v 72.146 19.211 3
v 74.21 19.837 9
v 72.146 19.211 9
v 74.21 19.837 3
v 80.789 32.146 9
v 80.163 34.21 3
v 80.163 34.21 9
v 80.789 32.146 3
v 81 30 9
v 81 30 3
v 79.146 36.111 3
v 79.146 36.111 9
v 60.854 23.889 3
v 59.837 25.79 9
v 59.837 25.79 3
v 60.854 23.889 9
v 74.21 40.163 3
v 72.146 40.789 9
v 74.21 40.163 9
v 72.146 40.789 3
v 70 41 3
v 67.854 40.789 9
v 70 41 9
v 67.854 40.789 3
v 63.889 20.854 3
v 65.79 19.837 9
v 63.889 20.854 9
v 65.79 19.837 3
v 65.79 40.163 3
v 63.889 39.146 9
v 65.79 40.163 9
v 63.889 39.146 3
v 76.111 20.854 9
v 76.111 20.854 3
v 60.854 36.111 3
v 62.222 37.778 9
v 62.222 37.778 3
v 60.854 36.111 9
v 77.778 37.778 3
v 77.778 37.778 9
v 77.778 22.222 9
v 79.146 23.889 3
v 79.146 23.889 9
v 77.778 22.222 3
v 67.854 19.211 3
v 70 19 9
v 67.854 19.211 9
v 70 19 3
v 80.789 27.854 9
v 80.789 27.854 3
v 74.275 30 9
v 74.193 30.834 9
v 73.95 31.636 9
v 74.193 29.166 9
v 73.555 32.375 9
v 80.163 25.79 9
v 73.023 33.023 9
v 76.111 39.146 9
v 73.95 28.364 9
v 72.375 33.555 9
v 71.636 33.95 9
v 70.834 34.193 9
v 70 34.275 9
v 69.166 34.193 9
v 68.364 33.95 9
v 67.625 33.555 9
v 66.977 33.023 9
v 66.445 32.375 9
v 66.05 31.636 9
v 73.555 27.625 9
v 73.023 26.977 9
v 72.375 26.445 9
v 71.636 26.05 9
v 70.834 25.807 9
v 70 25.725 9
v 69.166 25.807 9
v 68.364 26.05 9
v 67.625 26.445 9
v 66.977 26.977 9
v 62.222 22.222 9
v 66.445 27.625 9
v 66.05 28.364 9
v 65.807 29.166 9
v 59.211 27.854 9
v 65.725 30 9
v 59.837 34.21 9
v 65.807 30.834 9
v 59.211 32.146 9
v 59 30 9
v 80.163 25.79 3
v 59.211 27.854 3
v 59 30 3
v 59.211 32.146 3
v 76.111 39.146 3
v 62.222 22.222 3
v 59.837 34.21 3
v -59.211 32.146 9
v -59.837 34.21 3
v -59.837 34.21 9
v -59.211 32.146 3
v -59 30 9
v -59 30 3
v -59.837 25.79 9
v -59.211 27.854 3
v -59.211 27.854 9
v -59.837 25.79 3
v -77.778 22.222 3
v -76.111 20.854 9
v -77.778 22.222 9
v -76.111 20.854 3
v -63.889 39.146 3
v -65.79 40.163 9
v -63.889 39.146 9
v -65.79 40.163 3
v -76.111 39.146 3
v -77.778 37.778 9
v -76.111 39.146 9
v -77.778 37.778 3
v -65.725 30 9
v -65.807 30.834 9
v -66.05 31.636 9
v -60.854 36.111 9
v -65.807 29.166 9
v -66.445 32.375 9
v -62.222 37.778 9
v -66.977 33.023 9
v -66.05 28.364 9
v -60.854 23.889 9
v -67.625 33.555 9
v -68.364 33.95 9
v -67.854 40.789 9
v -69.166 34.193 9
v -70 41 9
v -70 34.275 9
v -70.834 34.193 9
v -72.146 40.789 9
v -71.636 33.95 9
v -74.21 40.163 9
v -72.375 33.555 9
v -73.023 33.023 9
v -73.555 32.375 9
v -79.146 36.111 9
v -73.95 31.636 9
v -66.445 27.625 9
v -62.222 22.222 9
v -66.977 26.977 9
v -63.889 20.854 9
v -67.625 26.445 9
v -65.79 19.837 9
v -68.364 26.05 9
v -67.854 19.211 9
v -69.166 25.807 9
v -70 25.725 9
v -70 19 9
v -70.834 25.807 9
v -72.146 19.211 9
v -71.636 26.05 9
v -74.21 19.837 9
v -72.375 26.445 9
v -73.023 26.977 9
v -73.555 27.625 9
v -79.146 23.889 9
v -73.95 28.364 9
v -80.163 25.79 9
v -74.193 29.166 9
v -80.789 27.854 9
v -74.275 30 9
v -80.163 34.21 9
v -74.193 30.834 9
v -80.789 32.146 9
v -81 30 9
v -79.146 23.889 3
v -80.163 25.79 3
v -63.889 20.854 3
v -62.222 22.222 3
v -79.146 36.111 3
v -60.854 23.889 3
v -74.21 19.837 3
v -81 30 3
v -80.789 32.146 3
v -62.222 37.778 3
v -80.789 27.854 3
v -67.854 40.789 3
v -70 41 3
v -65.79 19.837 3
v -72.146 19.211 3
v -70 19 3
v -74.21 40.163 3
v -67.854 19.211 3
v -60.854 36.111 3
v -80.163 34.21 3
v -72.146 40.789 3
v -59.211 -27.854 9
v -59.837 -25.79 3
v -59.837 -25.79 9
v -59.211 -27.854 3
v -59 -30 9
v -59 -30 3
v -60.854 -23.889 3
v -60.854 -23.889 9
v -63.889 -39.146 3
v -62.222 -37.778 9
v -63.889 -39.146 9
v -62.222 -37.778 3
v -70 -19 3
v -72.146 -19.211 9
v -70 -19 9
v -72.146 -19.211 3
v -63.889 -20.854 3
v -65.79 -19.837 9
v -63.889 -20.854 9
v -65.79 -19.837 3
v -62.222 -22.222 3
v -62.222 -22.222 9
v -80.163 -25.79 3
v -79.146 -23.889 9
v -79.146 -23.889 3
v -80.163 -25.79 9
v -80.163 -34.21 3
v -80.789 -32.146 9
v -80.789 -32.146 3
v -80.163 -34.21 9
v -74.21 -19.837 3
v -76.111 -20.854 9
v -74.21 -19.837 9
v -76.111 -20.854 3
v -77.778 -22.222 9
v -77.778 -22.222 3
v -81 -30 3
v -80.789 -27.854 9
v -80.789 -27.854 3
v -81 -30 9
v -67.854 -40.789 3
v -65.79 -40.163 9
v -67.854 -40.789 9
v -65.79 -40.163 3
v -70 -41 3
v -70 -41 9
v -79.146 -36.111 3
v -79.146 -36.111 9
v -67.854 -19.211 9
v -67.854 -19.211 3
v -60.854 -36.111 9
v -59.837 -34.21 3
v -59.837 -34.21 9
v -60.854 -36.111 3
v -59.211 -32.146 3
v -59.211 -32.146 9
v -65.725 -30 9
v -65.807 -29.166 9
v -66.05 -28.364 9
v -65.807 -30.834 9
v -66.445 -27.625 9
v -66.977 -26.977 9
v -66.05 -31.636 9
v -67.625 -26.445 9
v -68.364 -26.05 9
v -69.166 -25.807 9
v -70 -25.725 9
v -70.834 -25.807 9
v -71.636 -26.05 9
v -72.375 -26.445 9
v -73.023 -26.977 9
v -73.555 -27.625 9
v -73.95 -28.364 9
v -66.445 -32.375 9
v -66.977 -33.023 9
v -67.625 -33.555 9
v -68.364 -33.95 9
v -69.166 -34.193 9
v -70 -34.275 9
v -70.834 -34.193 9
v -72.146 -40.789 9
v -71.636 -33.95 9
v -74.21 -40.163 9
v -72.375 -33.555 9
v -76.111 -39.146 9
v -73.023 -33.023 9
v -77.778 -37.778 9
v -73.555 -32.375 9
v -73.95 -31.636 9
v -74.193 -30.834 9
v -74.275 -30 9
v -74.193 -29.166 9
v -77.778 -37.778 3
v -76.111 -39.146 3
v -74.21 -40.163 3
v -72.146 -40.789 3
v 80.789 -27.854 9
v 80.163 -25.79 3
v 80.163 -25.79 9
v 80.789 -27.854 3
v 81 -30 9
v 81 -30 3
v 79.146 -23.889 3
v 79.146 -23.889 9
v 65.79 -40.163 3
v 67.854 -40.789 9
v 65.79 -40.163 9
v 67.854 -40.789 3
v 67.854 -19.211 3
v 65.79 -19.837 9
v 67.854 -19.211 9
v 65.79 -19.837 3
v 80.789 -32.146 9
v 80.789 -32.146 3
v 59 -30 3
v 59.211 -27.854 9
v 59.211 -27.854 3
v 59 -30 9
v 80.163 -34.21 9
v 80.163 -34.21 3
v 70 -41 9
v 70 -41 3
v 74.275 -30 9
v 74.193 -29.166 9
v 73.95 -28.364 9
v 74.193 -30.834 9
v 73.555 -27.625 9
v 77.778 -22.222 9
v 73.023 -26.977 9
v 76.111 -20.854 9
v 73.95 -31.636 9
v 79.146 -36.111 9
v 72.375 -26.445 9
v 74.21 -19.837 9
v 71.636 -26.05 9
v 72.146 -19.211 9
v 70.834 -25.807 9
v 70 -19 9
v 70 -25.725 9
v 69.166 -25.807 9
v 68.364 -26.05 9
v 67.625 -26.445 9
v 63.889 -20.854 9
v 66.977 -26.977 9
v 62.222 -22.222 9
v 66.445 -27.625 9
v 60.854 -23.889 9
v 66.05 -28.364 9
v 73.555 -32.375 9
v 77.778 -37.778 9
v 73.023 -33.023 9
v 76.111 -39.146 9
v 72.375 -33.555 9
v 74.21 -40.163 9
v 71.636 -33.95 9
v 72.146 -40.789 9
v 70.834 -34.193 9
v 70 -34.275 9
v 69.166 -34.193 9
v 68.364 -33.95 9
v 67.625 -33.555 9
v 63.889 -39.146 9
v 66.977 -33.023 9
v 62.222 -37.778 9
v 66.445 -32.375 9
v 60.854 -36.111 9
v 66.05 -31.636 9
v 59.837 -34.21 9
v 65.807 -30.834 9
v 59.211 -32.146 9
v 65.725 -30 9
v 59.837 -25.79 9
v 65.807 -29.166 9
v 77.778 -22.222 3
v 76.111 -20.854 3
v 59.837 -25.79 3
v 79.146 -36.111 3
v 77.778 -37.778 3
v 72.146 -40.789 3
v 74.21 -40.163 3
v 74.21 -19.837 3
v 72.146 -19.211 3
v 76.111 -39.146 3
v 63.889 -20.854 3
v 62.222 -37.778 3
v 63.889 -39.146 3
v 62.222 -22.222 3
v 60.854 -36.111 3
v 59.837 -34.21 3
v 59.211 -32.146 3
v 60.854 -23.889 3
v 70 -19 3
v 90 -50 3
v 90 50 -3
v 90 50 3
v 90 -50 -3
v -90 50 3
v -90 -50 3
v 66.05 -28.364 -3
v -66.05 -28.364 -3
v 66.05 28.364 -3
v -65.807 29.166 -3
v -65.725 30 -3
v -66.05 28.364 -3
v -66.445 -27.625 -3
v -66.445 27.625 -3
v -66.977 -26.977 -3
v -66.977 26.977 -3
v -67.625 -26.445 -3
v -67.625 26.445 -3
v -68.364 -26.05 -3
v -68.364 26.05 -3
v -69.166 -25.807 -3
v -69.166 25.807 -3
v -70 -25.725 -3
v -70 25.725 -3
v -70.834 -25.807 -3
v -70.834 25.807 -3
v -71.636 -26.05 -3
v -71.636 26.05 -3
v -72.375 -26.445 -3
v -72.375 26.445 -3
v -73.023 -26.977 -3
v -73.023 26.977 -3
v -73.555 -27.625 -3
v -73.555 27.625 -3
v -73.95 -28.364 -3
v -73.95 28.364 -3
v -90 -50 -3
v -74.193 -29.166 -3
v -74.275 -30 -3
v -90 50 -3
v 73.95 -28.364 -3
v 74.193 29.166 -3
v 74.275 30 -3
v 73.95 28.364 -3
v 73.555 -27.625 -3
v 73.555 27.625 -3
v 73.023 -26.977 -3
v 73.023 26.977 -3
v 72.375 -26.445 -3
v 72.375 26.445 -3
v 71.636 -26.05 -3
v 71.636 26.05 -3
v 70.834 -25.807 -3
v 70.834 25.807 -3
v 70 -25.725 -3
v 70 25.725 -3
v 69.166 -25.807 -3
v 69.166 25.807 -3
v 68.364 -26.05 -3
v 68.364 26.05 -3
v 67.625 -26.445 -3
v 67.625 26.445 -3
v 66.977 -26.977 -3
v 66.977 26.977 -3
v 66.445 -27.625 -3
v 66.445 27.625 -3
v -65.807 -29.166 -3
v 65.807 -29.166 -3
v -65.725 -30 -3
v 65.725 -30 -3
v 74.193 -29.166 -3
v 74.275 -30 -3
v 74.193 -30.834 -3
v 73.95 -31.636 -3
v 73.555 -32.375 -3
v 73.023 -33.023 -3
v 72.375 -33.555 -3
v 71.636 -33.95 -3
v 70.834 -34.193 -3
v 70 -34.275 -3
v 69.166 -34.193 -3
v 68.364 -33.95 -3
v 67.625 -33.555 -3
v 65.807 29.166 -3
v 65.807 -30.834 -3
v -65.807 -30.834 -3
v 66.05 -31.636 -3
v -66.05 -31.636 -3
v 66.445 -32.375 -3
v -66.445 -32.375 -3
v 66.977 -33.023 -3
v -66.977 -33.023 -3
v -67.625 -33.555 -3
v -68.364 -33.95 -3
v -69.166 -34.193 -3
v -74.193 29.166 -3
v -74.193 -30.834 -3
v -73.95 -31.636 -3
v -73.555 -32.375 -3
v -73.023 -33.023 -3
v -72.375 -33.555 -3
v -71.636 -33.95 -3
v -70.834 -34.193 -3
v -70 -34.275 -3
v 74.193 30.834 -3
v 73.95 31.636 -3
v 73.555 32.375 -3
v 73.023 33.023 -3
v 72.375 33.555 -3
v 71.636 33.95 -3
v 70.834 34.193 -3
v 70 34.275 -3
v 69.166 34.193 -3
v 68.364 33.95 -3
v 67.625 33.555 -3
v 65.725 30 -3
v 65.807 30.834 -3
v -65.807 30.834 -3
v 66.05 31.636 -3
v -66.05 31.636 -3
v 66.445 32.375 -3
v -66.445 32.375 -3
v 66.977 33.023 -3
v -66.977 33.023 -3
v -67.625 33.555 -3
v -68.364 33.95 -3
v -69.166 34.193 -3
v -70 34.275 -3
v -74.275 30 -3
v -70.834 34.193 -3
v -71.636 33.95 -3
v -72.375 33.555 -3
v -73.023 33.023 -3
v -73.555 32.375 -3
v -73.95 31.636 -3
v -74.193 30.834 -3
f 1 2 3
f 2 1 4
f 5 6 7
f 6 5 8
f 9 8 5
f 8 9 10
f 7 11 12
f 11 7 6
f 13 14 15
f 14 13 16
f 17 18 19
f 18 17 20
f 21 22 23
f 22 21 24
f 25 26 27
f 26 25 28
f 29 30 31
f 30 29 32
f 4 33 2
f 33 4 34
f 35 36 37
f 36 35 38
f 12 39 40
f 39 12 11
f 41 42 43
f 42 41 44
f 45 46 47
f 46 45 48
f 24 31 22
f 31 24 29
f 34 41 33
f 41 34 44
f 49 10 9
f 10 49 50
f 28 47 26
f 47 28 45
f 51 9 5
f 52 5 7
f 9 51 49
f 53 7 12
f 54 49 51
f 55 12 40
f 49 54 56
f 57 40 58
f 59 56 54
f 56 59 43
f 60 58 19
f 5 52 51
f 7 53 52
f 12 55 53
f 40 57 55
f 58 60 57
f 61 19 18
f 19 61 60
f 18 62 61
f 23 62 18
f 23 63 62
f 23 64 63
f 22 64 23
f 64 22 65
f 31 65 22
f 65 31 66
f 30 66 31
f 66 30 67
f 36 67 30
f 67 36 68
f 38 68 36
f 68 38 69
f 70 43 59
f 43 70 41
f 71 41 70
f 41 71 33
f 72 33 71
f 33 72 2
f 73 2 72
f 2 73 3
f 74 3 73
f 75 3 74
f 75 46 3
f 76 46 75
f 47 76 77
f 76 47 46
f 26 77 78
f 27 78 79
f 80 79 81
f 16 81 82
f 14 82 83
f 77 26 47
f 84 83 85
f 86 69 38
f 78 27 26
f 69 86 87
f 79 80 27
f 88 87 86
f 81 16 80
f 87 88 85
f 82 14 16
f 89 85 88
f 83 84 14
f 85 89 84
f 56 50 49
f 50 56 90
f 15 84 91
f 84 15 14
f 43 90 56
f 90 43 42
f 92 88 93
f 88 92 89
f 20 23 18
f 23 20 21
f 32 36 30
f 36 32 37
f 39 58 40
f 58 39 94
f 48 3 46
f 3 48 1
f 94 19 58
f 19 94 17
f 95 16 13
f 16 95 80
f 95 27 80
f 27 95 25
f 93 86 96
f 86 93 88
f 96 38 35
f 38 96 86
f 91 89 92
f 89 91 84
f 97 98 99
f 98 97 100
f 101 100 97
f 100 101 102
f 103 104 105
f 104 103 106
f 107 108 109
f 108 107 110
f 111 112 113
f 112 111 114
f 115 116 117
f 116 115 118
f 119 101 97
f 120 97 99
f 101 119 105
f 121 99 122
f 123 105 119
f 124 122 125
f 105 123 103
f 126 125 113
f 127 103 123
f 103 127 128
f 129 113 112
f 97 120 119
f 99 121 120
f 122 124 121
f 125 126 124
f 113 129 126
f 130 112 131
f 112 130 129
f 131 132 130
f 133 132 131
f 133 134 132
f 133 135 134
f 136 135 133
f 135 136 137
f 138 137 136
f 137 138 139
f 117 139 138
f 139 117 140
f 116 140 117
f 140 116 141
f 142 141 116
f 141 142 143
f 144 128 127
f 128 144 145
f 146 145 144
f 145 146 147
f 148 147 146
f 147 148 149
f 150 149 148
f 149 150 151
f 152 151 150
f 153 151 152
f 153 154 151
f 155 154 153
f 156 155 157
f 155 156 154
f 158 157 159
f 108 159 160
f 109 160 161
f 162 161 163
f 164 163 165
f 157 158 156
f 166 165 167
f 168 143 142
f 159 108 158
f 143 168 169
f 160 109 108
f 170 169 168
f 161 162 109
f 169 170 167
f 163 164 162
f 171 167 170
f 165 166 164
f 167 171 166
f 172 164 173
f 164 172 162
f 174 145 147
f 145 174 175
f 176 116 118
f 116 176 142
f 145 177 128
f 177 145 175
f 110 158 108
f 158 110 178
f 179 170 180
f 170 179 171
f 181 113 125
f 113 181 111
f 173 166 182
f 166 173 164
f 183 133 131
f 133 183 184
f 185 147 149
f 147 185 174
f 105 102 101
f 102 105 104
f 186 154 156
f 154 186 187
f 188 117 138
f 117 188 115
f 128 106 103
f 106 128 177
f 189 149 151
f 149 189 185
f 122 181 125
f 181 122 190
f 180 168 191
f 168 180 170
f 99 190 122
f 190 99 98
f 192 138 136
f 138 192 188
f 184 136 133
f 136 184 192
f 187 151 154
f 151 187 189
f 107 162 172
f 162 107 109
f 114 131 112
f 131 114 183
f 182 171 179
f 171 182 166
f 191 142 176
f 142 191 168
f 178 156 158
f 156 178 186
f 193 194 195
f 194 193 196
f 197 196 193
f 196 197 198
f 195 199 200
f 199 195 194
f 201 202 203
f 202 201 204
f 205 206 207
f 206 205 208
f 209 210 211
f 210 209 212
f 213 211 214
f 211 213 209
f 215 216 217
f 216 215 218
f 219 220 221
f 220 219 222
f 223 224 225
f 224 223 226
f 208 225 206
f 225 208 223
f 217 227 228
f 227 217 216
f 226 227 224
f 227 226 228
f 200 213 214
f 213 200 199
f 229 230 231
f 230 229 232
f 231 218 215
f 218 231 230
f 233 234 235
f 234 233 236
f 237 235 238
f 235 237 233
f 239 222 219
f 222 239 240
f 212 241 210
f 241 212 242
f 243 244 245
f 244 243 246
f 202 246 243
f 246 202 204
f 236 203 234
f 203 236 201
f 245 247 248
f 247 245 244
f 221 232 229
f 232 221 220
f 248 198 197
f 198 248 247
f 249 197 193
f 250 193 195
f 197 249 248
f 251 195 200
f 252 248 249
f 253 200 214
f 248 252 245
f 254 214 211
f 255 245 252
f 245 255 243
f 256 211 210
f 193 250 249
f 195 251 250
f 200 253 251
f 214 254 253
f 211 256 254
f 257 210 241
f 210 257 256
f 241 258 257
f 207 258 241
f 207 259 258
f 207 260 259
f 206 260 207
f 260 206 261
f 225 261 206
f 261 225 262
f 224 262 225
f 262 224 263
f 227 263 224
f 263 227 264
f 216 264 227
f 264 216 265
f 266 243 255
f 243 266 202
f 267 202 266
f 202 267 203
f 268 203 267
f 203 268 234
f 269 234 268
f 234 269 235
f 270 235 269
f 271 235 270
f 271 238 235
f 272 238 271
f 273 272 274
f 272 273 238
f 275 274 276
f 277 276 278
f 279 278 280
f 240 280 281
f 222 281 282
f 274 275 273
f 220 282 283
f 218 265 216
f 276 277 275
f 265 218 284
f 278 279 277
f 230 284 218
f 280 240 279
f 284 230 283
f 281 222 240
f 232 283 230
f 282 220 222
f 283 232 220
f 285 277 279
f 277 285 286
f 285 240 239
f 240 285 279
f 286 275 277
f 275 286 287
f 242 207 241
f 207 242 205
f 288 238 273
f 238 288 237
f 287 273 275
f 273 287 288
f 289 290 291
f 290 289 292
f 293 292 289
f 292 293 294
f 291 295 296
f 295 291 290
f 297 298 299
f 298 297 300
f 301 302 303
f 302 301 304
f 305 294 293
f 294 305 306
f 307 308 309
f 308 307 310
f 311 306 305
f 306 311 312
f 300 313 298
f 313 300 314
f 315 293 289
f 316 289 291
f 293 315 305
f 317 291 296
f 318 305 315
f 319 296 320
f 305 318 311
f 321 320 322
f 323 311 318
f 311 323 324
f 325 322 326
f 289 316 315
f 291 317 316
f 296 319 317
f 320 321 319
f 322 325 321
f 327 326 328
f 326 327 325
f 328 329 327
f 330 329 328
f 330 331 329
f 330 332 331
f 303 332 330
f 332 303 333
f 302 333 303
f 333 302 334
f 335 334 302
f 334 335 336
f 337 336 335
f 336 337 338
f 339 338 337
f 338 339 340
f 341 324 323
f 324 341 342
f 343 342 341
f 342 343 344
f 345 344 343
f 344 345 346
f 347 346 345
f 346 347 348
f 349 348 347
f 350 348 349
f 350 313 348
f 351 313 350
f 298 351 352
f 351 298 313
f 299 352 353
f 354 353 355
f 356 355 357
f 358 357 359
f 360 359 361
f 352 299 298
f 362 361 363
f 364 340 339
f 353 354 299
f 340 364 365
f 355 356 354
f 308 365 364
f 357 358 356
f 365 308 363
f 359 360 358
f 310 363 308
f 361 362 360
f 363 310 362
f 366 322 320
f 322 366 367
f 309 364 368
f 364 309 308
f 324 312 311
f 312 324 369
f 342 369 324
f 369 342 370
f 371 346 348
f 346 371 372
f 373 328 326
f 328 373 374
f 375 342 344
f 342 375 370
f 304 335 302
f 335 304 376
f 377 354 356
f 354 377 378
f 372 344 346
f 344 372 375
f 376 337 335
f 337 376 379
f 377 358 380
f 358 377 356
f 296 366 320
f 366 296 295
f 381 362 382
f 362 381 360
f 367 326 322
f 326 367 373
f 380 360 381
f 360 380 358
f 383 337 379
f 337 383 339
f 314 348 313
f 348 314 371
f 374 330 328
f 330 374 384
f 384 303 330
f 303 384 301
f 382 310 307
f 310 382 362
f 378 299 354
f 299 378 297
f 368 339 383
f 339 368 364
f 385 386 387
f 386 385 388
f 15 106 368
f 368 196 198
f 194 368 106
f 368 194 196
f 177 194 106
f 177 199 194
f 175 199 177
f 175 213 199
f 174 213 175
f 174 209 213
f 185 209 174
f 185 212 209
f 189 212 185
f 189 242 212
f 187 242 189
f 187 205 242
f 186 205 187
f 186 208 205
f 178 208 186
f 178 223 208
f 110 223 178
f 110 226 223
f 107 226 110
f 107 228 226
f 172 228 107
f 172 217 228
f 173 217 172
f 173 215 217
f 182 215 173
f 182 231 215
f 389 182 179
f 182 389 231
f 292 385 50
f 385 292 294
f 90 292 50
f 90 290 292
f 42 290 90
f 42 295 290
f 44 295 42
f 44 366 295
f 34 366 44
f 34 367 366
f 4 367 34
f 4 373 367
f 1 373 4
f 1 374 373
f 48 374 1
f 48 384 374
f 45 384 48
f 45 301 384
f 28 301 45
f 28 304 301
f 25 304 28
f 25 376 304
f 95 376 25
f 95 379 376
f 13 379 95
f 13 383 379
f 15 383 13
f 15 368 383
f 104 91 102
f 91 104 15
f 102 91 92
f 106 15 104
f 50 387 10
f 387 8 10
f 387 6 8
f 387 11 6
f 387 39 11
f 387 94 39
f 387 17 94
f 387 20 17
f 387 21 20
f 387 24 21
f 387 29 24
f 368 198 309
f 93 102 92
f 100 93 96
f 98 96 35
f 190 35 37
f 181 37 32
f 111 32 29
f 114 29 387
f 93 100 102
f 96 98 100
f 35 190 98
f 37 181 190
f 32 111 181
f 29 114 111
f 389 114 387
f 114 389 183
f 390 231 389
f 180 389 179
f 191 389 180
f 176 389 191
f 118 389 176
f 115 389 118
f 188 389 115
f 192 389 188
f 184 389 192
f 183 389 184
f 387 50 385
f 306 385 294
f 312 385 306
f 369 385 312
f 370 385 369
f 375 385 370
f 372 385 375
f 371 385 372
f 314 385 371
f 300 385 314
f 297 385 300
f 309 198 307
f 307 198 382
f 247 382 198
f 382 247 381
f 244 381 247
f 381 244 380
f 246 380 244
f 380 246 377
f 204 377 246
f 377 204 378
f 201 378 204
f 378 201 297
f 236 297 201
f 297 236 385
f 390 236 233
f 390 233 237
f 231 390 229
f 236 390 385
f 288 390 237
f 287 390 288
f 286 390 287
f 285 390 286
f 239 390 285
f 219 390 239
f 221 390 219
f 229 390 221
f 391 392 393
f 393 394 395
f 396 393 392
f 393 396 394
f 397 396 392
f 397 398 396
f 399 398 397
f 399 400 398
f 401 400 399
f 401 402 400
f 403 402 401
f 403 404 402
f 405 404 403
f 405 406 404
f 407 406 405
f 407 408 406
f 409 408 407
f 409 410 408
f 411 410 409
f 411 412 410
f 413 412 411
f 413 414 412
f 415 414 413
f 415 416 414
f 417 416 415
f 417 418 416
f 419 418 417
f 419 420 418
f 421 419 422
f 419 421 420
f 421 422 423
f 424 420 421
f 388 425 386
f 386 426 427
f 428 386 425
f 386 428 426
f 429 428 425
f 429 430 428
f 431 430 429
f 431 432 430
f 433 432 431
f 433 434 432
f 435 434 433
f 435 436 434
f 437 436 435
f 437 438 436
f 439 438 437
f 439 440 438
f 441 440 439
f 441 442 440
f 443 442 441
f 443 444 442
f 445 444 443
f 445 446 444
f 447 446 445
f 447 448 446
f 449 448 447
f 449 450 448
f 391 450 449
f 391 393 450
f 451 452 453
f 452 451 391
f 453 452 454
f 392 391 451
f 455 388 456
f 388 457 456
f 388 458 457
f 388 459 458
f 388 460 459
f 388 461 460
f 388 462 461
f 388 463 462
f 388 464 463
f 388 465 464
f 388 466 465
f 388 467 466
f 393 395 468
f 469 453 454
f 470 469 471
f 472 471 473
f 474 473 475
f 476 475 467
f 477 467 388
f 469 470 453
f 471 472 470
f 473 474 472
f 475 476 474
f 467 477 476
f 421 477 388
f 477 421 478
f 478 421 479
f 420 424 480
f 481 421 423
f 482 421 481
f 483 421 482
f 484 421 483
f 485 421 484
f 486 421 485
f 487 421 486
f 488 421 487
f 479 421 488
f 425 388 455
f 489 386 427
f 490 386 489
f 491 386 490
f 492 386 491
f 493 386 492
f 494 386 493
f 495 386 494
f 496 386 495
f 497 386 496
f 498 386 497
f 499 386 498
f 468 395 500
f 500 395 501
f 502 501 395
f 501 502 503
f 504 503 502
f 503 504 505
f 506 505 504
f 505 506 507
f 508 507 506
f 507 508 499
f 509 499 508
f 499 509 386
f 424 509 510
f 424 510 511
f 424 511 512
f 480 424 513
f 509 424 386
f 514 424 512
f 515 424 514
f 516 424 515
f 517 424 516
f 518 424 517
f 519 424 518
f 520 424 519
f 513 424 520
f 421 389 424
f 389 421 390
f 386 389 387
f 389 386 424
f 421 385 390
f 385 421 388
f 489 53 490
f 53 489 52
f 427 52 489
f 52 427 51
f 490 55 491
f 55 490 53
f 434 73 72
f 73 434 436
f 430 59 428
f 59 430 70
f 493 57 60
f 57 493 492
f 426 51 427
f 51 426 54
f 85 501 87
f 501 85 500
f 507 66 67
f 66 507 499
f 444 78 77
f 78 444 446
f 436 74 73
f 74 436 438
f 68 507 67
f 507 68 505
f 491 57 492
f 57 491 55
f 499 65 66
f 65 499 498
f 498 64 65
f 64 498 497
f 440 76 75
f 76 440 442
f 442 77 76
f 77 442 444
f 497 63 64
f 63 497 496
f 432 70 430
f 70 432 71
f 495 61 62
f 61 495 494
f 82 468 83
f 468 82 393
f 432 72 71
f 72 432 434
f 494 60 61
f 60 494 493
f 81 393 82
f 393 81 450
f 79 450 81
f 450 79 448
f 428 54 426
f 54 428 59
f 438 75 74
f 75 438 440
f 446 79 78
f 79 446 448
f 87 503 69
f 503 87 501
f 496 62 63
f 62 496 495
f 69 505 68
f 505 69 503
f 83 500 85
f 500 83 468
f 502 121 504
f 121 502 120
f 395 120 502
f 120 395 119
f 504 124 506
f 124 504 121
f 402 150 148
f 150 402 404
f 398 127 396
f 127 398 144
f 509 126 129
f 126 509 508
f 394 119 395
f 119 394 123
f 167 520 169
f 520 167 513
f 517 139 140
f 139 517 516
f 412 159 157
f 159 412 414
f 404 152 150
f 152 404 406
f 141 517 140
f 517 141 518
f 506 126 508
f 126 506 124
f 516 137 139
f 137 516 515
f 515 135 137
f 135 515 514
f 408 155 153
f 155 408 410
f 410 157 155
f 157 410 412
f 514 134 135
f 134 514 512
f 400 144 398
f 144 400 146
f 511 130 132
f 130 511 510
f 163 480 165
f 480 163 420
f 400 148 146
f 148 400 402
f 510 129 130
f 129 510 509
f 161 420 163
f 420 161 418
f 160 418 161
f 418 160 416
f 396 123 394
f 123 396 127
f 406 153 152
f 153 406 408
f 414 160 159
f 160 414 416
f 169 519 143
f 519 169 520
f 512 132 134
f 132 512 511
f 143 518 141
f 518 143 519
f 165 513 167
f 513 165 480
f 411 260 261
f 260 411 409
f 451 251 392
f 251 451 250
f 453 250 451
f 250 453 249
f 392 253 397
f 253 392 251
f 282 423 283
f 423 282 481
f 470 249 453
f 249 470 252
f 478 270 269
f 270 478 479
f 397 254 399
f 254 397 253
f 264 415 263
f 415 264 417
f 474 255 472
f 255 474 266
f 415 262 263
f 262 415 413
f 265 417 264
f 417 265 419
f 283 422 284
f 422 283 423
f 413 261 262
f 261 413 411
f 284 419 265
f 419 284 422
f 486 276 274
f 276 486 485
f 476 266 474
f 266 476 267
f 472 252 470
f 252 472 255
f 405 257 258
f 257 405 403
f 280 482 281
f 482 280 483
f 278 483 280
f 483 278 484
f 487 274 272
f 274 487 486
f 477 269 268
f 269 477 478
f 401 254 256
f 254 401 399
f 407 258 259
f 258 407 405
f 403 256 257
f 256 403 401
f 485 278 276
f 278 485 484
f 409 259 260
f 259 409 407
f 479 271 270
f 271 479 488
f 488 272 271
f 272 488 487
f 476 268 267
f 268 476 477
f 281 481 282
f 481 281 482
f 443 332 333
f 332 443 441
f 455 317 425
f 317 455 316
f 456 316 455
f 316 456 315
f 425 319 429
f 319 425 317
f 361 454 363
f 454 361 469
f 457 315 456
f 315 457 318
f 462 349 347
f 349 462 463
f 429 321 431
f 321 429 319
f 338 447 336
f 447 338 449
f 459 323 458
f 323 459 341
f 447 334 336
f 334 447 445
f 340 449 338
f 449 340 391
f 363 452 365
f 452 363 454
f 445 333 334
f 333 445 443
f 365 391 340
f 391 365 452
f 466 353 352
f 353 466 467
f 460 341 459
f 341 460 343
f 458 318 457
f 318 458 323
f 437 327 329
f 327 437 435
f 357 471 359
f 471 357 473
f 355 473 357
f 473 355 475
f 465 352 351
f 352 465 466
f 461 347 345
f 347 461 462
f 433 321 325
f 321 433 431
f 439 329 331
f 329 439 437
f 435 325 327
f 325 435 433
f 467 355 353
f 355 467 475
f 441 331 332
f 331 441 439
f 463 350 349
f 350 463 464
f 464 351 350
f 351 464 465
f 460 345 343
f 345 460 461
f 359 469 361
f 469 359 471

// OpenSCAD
$fn = 32;

// ----------------------------------------------------------------------
// Anchor pads 180 x 100 x 12
// four corner bosses with anchor holes
// ----------------------------------------------------------------------

// --- parameters (mm) ---
plate = [180, 100, 6];   // base plate size (x, y, z)
pads = 4;                // boss count, one per corner
edge = 20;               // boss centre offset from the plate edge
boss_d = 22;             // boss diameter
boss_h = 6;              // boss height above the base plate
bore_d = 8.4;            // nominal hole diameter from the drawing
print_allowance = 0.15;  // clearance added for printing

// --- derived feature positions (mm) ---
hole_d = bore_d + print_allowance;  // = 8.55   hole diameter as printed
height = plate[2] + boss_h;         // = 12   overall height of the part
corner_x = plate[0] / 2 - edge;     // = 70   boss centre X
corner_y = plate[1] / 2 - edge;     // = 30   boss centre Y
feature_centers = [
  [corner_x, corner_y],
  [-corner_x, corner_y],
  [-corner_x, -corner_y],
  [corner_x, -corner_y]
];   // boss centres, anchor holes are drilled there

// base plate, four bosses standing on it, anchor holes all the way through
difference() {
  union() {
    cube(plate, center = true);
    for (centre = feature_centers)
      translate([centre[0], centre[1], plate[2] / 2 - 1])
        cylinder(d = boss_d, h = boss_h + 1);
  }
  for (centre = feature_centers)
    translate([centre[0], centre[1], -height])
      cylinder(d = hole_d, h = 2 * height + 2);  // through boss and plate
}
